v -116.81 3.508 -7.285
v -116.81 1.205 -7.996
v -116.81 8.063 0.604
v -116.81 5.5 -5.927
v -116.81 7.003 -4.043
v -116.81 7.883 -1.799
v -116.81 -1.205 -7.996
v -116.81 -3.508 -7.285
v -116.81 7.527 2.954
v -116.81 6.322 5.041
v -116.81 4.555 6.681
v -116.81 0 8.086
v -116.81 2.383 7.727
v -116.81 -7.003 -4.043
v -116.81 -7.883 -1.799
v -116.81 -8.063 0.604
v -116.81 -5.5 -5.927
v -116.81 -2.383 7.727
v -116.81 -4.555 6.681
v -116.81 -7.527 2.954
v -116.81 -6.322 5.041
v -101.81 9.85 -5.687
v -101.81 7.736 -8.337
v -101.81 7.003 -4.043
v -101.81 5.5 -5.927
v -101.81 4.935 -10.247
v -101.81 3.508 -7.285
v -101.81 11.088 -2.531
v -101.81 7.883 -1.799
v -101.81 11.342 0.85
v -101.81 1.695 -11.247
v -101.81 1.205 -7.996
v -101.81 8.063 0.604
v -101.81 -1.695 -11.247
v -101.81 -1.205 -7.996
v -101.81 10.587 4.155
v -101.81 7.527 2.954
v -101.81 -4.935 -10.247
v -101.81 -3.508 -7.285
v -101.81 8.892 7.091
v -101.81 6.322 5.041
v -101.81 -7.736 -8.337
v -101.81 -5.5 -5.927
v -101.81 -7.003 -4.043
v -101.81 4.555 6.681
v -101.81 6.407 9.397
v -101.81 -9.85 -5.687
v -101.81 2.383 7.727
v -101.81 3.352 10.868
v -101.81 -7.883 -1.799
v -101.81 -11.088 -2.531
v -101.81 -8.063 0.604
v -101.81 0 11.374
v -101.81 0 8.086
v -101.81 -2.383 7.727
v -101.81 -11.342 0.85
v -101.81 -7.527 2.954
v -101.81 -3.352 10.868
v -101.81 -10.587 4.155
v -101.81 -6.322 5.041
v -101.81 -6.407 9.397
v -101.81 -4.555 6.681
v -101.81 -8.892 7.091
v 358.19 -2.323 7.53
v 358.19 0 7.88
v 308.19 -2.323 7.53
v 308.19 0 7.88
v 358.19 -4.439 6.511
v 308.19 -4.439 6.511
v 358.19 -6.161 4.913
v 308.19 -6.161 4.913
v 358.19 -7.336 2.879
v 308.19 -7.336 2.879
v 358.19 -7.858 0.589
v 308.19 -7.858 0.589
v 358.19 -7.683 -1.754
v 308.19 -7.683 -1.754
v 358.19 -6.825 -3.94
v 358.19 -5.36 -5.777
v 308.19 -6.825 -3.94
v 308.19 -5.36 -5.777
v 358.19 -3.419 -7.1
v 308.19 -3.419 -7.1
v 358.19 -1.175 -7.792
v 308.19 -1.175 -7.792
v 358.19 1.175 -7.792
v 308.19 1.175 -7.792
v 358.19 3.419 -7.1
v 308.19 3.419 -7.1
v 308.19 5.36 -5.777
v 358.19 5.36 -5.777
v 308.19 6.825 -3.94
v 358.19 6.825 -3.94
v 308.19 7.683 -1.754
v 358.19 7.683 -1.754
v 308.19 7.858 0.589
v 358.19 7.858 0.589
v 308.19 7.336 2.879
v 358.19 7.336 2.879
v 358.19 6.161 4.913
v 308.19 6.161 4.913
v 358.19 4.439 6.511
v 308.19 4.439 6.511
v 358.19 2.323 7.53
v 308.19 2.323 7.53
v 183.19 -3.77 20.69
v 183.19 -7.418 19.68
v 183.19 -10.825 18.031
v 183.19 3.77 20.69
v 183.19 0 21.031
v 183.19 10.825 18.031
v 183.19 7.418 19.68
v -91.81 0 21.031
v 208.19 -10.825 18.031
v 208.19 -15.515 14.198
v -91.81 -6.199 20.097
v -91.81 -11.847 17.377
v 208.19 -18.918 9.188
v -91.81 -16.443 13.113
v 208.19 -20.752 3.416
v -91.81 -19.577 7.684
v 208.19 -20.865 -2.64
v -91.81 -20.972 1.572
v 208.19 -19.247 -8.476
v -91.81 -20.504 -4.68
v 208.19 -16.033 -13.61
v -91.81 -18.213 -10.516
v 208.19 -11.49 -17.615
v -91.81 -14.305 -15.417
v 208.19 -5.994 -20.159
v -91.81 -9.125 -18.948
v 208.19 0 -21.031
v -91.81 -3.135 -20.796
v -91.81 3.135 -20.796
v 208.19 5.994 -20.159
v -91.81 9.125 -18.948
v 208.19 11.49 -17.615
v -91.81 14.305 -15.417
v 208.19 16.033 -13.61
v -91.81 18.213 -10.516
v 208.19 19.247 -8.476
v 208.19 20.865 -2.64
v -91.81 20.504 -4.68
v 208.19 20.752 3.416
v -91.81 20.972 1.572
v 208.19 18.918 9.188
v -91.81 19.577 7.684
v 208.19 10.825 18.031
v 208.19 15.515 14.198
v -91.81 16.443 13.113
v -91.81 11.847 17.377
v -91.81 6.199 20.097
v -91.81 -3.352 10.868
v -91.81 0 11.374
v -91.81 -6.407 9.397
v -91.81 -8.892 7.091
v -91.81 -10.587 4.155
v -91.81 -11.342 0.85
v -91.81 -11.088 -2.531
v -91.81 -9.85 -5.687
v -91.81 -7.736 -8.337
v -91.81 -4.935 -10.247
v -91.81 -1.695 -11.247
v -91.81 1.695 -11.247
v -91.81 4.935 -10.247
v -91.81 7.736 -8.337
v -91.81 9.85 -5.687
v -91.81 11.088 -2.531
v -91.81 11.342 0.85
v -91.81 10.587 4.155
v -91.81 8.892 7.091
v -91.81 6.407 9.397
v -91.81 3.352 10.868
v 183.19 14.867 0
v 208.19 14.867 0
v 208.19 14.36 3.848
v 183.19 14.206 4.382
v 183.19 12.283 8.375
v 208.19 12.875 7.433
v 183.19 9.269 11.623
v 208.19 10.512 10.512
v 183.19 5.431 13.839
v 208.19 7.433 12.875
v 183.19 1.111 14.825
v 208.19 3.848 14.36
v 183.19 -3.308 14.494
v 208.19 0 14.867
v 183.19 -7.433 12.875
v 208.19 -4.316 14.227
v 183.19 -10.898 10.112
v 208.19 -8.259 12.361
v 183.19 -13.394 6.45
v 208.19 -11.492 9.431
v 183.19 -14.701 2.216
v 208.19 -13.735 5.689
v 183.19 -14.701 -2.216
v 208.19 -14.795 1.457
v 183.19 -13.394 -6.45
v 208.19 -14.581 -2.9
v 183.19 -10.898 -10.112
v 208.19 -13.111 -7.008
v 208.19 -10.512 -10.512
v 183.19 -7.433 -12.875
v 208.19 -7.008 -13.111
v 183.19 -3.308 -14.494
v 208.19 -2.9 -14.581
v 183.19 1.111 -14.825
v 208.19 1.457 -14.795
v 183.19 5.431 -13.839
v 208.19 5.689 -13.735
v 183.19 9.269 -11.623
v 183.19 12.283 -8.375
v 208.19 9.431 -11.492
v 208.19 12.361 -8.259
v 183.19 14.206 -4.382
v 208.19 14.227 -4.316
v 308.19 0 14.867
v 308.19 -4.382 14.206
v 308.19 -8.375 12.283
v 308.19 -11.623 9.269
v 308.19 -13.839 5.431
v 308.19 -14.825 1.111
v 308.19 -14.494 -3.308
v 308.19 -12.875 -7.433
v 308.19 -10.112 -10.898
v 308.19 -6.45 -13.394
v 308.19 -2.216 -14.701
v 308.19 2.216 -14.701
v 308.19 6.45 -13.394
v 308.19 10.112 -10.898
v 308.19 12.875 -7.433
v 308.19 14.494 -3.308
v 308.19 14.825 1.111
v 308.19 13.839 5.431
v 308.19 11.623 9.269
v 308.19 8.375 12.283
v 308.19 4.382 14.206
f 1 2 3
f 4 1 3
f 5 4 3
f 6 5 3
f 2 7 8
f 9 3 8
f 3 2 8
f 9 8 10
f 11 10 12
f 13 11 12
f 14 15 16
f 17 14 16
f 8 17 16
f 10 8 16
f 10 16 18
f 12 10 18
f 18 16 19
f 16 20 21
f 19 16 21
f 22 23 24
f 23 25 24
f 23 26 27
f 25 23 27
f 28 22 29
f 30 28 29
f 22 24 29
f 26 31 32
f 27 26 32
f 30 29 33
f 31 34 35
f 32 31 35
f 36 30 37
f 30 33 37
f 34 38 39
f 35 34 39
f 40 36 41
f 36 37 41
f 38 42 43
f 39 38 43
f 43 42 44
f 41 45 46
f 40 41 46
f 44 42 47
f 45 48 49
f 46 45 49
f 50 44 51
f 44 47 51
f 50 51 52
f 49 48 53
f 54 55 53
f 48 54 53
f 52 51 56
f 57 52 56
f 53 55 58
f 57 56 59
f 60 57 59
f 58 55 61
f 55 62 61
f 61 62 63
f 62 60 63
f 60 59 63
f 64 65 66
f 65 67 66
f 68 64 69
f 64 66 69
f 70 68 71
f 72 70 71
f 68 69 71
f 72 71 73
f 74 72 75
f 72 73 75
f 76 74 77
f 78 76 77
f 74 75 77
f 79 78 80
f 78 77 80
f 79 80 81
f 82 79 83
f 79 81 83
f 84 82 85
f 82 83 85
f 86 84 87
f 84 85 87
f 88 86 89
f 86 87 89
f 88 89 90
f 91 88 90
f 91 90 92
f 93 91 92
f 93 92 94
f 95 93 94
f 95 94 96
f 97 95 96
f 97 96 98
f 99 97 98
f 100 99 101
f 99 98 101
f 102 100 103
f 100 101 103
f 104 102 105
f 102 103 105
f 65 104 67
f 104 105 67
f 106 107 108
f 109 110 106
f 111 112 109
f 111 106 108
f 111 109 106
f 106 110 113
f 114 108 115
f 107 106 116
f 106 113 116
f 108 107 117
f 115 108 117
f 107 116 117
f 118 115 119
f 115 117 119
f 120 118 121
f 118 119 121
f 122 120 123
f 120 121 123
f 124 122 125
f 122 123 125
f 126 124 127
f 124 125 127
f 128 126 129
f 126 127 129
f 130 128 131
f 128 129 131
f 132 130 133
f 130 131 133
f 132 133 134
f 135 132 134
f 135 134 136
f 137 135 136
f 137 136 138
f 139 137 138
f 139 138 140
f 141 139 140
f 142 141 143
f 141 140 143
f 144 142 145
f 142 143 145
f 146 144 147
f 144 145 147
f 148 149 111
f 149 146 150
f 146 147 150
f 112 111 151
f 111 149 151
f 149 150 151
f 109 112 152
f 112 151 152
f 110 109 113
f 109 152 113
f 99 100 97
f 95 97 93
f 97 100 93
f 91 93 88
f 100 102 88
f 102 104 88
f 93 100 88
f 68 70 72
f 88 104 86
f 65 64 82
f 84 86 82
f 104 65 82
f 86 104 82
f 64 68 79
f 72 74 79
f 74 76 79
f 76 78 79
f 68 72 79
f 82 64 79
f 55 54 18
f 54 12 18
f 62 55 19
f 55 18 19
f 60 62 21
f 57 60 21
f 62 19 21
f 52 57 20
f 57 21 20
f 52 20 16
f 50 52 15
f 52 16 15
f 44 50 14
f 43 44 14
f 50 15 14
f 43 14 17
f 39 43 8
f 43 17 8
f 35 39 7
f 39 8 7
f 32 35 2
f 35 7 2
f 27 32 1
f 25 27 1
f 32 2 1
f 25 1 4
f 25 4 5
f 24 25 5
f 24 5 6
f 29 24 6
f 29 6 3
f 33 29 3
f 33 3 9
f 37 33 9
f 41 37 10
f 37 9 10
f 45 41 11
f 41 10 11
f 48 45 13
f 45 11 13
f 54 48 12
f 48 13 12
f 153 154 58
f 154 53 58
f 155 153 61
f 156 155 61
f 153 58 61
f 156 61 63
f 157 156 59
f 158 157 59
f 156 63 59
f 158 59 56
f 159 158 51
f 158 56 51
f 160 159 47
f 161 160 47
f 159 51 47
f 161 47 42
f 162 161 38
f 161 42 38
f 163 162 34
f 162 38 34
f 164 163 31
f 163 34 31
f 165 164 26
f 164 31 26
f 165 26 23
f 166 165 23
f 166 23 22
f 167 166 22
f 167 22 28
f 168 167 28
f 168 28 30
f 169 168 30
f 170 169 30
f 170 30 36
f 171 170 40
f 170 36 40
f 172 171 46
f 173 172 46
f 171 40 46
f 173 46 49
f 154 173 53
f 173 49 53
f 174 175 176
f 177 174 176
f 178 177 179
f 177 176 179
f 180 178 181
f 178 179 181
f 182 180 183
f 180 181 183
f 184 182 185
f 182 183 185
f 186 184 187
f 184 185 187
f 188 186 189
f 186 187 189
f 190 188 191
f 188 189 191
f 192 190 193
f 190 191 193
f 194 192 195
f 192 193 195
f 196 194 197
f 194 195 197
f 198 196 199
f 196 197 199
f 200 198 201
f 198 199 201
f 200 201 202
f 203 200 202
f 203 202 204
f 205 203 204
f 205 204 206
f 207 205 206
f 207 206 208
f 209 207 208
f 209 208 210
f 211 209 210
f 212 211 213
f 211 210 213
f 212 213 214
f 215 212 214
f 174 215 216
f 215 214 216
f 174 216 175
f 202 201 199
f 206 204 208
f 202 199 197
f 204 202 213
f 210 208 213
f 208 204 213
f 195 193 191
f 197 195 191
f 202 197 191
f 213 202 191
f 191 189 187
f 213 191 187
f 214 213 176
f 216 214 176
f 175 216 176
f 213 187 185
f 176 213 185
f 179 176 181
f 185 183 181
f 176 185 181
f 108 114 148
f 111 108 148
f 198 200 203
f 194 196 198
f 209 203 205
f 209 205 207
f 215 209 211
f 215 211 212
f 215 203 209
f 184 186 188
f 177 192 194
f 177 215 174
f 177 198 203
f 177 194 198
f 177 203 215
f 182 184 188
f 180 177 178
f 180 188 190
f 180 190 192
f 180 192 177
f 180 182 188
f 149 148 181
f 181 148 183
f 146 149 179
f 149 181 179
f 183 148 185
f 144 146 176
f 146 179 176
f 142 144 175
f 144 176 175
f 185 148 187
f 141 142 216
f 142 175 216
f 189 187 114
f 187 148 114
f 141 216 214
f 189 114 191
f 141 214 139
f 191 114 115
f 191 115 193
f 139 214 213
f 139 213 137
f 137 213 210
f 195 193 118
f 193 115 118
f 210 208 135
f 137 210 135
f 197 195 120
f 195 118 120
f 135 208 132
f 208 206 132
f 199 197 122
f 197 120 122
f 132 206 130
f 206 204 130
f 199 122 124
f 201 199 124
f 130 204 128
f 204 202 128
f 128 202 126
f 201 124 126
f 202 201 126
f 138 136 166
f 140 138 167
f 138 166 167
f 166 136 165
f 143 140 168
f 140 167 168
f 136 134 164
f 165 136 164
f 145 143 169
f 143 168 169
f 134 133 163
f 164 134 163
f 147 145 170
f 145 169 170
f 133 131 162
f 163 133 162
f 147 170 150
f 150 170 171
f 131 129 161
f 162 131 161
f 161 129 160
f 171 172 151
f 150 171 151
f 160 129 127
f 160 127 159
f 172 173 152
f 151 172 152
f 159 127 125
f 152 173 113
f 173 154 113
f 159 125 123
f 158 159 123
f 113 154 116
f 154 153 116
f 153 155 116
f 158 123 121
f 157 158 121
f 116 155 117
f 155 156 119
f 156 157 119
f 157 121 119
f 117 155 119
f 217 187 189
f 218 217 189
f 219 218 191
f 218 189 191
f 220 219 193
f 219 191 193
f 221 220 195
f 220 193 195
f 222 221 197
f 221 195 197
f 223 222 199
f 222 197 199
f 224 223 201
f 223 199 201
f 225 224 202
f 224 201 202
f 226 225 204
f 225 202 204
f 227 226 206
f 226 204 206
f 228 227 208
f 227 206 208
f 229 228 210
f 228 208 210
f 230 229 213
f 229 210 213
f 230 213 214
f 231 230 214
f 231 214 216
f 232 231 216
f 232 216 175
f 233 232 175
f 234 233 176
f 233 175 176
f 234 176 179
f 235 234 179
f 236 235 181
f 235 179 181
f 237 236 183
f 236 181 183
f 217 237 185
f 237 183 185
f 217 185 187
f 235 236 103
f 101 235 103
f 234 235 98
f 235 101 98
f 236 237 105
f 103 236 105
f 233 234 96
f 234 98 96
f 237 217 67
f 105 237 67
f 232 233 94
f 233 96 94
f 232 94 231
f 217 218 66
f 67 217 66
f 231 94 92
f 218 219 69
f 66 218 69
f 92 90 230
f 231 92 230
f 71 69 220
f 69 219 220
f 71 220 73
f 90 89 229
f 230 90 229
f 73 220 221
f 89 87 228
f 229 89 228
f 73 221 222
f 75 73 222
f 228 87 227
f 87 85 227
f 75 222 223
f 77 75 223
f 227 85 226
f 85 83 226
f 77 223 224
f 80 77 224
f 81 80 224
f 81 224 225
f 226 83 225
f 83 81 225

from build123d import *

# Parameters (mm, degrees)
F2_R     = 14.866691899
F3_DEPTH = 25


with BuildPart() as f1:
    # F0 (on Front) → F1 (revolve)
    with BuildSketch(Plane.XZ):
        Polygon((-116.810104717, 0), (358.189895283, 0), (358.189895283, 7.8803886721), (308.189895283, 7.8803886721), (308.189895283, 14.866691899), (208.189895283, 14.866691899), (208.189895283, 21.0310760423), (-91.810104717, 21.0310760423), (-91.810104717, 11.3735402855), (-101.810104717, 11.3735402855), (-101.810104717, 8.0858688513), (-116.810104717, 8.0858688513), align=None)
    revolve(axis=Axis((120.689895283, 0, 0), (1, 0, 0)))

    # F2 (on face) → F3 (cut)
    with BuildSketch(Plane.YZ.offset(208.189895283)):
        with BuildLine():
            Line((10.8252693386, 18.0310760423), (41.9066511095, 18.0310760423))
            Line((41.9066511095, 18.0310760423), (41.9066511095, 27.3393926871))
            Line((41.9066511095, 27.3393926871), (-41.9066511095, 27.3393926871))
            Line((-41.9066511095, 27.3393926871), (-41.9066511095, 18.0310760423))
            Line((-41.9066511095, 18.0310760423), (-10.8252693386, 18.0310760423))
            ThreePointArc((-10.8252693386, 18.0310760423), (0, 21.0310760423), (10.8252693386, 18.0310760423))
        make_face()
        with BuildLine():
            Line((-10.8252693386, 18.0310760423), (10.8252693386, 18.0310760423))
            ThreePointArc((10.8252693386, 18.0310760423), (0, 21.0310760423), (-10.8252693386, 18.0310760423))
        make_face()
        Circle(F2_R)
    extrude(amount=-F3_DEPTH, mode=Mode.SUBTRACT)


solid = f1.part
